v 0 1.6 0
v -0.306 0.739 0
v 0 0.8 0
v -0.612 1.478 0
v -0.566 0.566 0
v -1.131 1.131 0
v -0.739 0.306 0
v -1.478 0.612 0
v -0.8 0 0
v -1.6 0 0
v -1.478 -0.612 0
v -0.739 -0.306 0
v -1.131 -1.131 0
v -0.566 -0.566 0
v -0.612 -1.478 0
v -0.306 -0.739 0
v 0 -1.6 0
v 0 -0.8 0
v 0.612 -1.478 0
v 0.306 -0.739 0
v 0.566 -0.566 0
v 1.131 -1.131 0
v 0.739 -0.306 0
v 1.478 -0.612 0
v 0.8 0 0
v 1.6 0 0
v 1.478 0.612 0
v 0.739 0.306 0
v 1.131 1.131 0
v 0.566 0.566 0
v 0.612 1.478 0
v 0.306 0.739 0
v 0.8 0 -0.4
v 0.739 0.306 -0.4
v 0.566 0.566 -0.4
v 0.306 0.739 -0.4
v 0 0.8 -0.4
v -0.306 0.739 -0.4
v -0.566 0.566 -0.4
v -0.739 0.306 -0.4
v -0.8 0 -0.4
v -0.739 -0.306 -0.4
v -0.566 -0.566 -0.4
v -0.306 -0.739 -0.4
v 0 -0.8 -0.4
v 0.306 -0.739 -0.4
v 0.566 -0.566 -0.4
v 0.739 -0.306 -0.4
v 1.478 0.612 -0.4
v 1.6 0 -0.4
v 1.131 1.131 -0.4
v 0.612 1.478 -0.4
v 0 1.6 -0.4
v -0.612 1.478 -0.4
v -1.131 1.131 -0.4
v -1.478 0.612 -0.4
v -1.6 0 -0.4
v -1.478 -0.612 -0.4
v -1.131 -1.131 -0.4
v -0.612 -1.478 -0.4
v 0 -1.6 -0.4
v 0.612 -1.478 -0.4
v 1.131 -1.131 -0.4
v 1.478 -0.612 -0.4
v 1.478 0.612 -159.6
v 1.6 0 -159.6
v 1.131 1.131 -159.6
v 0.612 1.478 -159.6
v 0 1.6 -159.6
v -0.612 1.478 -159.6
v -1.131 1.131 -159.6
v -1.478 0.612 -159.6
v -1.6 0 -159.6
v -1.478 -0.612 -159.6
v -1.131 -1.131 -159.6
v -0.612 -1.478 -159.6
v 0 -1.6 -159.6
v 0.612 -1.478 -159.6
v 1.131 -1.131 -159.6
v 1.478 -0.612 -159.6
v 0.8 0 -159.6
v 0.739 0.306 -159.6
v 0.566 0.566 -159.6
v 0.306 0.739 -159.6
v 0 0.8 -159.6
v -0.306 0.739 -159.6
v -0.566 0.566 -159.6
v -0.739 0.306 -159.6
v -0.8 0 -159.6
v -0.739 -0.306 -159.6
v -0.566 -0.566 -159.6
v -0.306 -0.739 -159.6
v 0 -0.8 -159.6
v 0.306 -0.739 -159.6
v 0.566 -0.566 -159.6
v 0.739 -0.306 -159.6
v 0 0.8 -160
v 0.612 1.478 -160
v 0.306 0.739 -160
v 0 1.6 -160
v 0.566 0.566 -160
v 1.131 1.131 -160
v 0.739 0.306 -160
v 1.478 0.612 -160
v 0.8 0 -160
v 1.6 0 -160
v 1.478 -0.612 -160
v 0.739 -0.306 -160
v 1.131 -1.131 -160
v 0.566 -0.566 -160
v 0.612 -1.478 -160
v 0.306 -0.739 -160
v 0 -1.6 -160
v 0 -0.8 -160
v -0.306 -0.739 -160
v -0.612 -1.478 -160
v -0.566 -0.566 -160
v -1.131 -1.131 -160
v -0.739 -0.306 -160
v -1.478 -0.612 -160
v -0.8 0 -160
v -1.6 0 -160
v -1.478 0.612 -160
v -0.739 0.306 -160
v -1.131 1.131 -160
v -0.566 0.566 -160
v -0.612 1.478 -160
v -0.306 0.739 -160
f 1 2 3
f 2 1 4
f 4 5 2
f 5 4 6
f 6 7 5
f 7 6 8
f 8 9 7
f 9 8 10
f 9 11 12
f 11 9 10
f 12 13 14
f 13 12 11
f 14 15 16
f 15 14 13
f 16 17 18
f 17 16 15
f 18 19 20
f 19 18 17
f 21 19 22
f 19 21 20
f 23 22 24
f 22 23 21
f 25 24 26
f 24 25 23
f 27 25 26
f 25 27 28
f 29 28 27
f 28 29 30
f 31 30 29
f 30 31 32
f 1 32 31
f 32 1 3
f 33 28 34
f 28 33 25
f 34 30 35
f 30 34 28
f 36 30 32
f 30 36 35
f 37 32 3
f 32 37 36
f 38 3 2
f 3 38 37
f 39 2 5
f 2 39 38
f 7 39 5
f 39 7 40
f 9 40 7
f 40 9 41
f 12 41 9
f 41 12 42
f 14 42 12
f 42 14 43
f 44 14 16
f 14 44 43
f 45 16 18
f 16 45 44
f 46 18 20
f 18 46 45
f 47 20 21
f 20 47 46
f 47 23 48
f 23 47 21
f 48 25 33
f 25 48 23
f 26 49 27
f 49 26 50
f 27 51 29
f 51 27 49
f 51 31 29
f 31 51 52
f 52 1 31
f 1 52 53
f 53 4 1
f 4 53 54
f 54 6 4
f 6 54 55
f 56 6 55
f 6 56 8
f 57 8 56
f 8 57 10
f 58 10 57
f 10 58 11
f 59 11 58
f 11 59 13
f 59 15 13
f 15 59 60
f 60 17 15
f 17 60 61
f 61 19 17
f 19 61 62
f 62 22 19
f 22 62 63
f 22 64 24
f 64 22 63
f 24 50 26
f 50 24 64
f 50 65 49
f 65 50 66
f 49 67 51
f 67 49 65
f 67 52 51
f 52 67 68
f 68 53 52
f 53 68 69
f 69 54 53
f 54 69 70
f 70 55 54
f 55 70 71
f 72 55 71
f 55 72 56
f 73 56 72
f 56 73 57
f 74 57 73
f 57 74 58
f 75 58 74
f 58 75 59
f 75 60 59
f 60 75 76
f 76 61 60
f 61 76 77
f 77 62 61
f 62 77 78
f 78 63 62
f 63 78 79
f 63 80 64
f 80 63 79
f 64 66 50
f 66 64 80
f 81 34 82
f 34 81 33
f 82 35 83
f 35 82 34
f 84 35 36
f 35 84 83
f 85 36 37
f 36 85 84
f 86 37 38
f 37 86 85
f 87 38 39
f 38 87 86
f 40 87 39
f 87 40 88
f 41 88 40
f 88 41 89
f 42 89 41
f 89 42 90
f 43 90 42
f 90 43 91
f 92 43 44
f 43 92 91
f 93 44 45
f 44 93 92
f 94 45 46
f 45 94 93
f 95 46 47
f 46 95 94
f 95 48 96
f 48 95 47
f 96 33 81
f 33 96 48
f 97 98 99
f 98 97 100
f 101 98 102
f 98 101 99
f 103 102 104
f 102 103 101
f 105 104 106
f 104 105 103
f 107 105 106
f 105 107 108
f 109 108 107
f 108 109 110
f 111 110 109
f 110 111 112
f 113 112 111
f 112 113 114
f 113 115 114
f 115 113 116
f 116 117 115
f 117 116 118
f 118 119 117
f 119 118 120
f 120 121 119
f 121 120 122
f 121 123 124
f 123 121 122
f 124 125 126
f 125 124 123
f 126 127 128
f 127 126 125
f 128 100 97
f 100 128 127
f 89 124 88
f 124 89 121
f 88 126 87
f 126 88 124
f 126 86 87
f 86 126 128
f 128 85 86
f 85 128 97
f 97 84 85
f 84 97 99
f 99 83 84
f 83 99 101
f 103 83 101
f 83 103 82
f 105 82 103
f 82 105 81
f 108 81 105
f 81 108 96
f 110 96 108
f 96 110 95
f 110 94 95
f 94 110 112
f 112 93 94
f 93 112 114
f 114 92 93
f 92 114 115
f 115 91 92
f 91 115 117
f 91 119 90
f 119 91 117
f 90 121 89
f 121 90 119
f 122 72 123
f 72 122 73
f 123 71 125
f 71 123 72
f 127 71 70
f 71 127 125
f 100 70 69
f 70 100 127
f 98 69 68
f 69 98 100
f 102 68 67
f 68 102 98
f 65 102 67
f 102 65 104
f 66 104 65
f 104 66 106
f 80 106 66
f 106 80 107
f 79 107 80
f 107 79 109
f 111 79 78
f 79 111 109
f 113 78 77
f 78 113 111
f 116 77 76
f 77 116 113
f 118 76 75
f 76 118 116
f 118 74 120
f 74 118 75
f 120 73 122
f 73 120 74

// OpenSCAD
// file: ../p/4-4ring1.scad
use <../lib.scad>
function ldraw_lib__4_4ring1() = [
// 0 Ring  1 x 1.0
// 0 Name: 4-4ring1.dat
// 0 Author: James Jessiman
// 0 !LDRAW_ORG Primitive UPDATE 2009-01
// 0 !LICENSE Licensed under CC BY 2.0 and CC BY 4.0 : see CAreadme.txt
// 
// 0 BFC CERTIFY CCW
  [0,"BFC","CERTIFY"],
  [0,"BFC","CCW"],
// 
// 0 !HISTORY 1998-12-15 [PTadmin] Official Update 1998-10
// 0 !HISTORY 2002-04-08 [BrickCaster] Modified for BFC compliance
// 0 !HISTORY 2002-04-25 [PTadmin] Official Update 2002-02
// 0 !HISTORY 2007-06-24 [PTadmin] Header formatted for Contributor Agreement
// 0 !HISTORY 2008-07-01 [PTadmin] Official Update 2008-01
// 0 !HISTORY 2008-08-26 [cwdee] Switch polygon winding and rename
// 0 !HISTORY 2009-05-02 [PTadmin] Official Update 2009-01
// 
// 
// 4 16 -0.7654 0 1.8478 -0.3827 0 0.9239 0 0 1 0 0 2
  [4,16,-0.7654,0,1.8478,-0.3827,0,0.9239,0,0,1,0,0,2],
// 4 16 -1.4142 0 1.4142 -0.7071 0 0.7071 -0.3827 0 0.9239 -0.7654 0 1.8478
  [4,16,-1.4142,0,1.4142,-0.7071,0,0.7071,-0.3827,0,0.9239,-0.7654,0,1.8478],
// 4 16 -1.8478 0 0.7654 -0.9239 0 0.3827 -0.7071 0 0.7071 -1.4142 0 1.41420
  [4,16,-1.8478,0,0.7654,-0.9239,0,0.3827,-0.7071,0,0.7071,-1.4142,0,1.41420],
// 4 16 -2 0 0 -1 0 0 -0.9239 0 0.3827 -1.8478 0 0.7654
  [4,16,-2,0,0,-1,0,0,-0.9239,0,0.3827,-1.8478,0,0.7654],
// 4 16 -1.8478 0 -0.7654 -0.9239 0 -0.3827 -1 0 0 -2 0 0
  [4,16,-1.8478,0,-0.7654,-0.9239,0,-0.3827,-1,0,0,-2,0,0],
// 4 16 -1.4142 0 -1.4142 -0.7071 0 -0.7071 -0.9239 0 -0.3827 -1.8478 0 -0.7654
  [4,16,-1.4142,0,-1.4142,-0.7071,0,-0.7071,-0.9239,0,-0.3827,-1.8478,0,-0.7654],
// 4 16 -0.7654 0 -1.8478 -0.3827 0 -0.9239 -0.7071 0 -0.7071 -1.4142 0 -1.4142
  [4,16,-0.7654,0,-1.8478,-0.3827,0,-0.9239,-0.7071,0,-0.7071,-1.4142,0,-1.4142],
// 4 16 0 0 -2 0 0 -1 -0.3827 0 -0.9239 -0.7654 0 -1.8478
  [4,16,0,0,-2,0,0,-1,-0.3827,0,-0.9239,-0.7654,0,-1.8478],
// 4 16 0.7654 0 -1.8478 0.3827 0 -0.9239 0 0 -1 0 0 -2
  [4,16,0.7654,0,-1.8478,0.3827,0,-0.9239,0,0,-1,0,0,-2],
// 4 16 1.4142 0 -1.4142 0.7071 0 -0.7071 0.3827 0 -0.9239 0.7654 0 -1.8478
  [4,16,1.4142,0,-1.4142,0.7071,0,-0.7071,0.3827,0,-0.9239,0.7654,0,-1.8478],
// 4 16 1.8478 0 -0.7654 0.9239 0 -0.3827 0.7071 0 -0.7071 1.4142 0 -1.4142
  [4,16,1.8478,0,-0.7654,0.9239,0,-0.3827,0.7071,0,-0.7071,1.4142,0,-1.4142],
// 4 16 2 0 0 1 0 0 0.9239 0 -0.3827 1.8478 0 -0.7654
  [4,16,2,0,0,1,0,0,0.9239,0,-0.3827,1.8478,0,-0.7654],
// 4 16 1.8478 0 0.7654 0.9239 0 0.3827 1 0 0 2 0 0
  [4,16,1.8478,0,0.7654,0.9239,0,0.3827,1,0,0,2,0,0],
// 4 16 1.4142 0 1.4142 0.7071 0 0.7071 0.9239 0 0.3827 1.8478 0 0.7654
  [4,16,1.4142,0,1.4142,0.7071,0,0.7071,0.9239,0,0.3827,1.8478,0,0.7654],
// 4 16 0.7654 0 1.8478 0.3827 0 0.9239 0.7071 0 0.7071 1.4142 0 1.4142
  [4,16,0.7654,0,1.8478,0.3827,0,0.9239,0.7071,0,0.7071,1.4142,0,1.4142],
// 4 16 0 0 2 0 0 1 0.3827 0 0.9239 0.7654 0 1.8478
  [4,16,0,0,2,0,0,1,0.3827,0,0.9239,0.7654,0,1.8478],
// 0
];
makepoly(ldraw_lib__4_4ring1(), line=0.2);
// file: ../p/4-4edge.scad
use <../lib.scad>
function ldraw_lib__4_4edge() = [
// 0 Circle 1.0
// 0 Name: 4-4edge.dat
// 0 Author: James Jessiman
// 0 !LDRAW_ORG Primitive UPDATE 2017-01
// 0 !LICENSE Licensed under CC BY 2.0 and CC BY 4.0 : see CAreadme.txt
// 
// 0 BFC CERTIFY CCW
  [0,"BFC","CERTIFY"],
  [0,"BFC","CCW"],
// 
// 0 !HISTORY 1998-12-15 [PTadmin] Official Update 1998-10
// 0 !HISTORY 2005-12-28 [PTadmin] Official Update 2005-01
// 0 !HISTORY 2007-06-24 [PTadmin] Header formatted for Contributor Agreement
// 0 !HISTORY 2008-07-01 [PTadmin] Official Update 2008-01
// 0 !HISTORY 2017-01-15 [Steffen] BFCed
// 0 !HISTORY 2017-12-30 [PTadmin] Official Update 2017-01
// 
// 
// 2 24 1 0 0 0.9239 0 0.3827
  [2,24,1,0,0,0.9239,0,0.3827],
// 2 24 0.9239 0 0.3827 0.7071 0 0.7071
  [2,24,0.9239,0,0.3827,0.7071,0,0.7071],
// 2 24 0.7071 0 0.7071 0.3827 0 0.9239
  [2,24,0.7071,0,0.7071,0.3827,0,0.9239],
// 2 24 0.3827 0 0.9239 0 0 1
  [2,24,0.3827,0,0.9239,0,0,1],
// 2 24 0 0 1 -0.3827 0 0.9239
  [2,24,0,0,1,-0.3827,0,0.9239],
// 2 24 -0.3827 0 0.9239 -0.7071 0 0.7071
  [2,24,-0.3827,0,0.9239,-0.7071,0,0.7071],
// 2 24 -0.7071 0 0.7071 -0.9239 0 0.3827
  [2,24,-0.7071,0,0.7071,-0.9239,0,0.3827],
// 2 24 -0.9239 0 0.3827 -1 0 -0
  [2,24,-0.9239,0,0.3827,-1,0,-0],
// 2 24 -1 0 -0 -0.9239 0 -0.3827
  [2,24,-1,0,-0,-0.9239,0,-0.3827],
// 2 24 -0.9239 0 -0.3827 -0.7071 0 -0.7071
  [2,24,-0.9239,0,-0.3827,-0.7071,0,-0.7071],
// 2 24 -0.7071 0 -0.7071 -0.3827 0 -0.9239
  [2,24,-0.7071,0,-0.7071,-0.3827,0,-0.9239],
// 2 24 -0.3827 0 -0.9239 0 0 -1
  [2,24,-0.3827,0,-0.9239,0,0,-1],
// 2 24 0 0 -1 0.3827 0 -0.9239
  [2,24,0,0,-1,0.3827,0,-0.9239],
// 2 24 0.3827 0 -0.9239 0.7071 0 -0.7071
  [2,24,0.3827,0,-0.9239,0.7071,0,-0.7071],
// 2 24 0.7071 0 -0.7071 0.9239 0 -0.3827
  [2,24,0.7071,0,-0.7071,0.9239,0,-0.3827],
// 2 24 0.9239 0 -0.3827 1 0 0
  [2,24,0.9239,0,-0.3827,1,0,0],
];
makepoly(ldraw_lib__4_4edge(), line=0.2);
// file: ../p/4-4cyli.scad
use <../lib.scad>
function ldraw_lib__4_4cyli() = [
// 0 Cylinder 1.0
// 0 Name: 4-4cyli.dat
// 0 Author: James Jessiman
// 0 !LDRAW_ORG Primitive UPDATE 2005-01
// 0 !LICENSE Licensed under CC BY 2.0 and CC BY 4.0 : see CAreadme.txt
// 
// 0 BFC CERTIFY CCW
  [0,"BFC","CERTIFY"],
  [0,"BFC","CCW"],
// 
// 0 !HISTORY 1998-12-15 [PTadmin] Official Update 1998-10
// 0 !HISTORY 2002-03-23 [sbliss] Added BFC statement; merged headers from files in distributions LDraw 0.27 and Complete.
// 0 !HISTORY 2002-04-25 [PTadmin] Official Update 2002-02
// 0 !HISTORY 2004-12-14 [guyvivan] BFC CCW
// 0 !HISTORY 2005-12-28 [PTadmin] Official Update 2005-01
// 0 !HISTORY 2007-06-24 [PTadmin] Header formatted for Contributor Agreement
// 0 !HISTORY 2008-07-01 [PTadmin] Official Update 2008-01
// 
// 
// 4 16 1 1 0 0.9239 1 0.3827 0.9239 0 0.3827 1 0 0
  [4,16,1,1,0,0.9239,1,0.3827,0.9239,0,0.3827,1,0,0],
// 5 24 1 0 0 1 1 0 0.9239 0 0.3827 0.9239 0 -0.3827
  [5,24,1,0,0,1,1,0,0.9239,0,0.3827,0.9239,0,-0.3827],
// 4 16 0.9239 1 0.3827 0.7071 1 0.7071 0.7071 0 0.7071 0.9239 0 0.3827
  [4,16,0.9239,1,0.3827,0.7071,1,0.7071,0.7071,0,0.7071,0.9239,0,0.3827],
// 5 24 0.9239 0 0.3827 0.9239 1 0.3827 0.7071 0 0.7071 1 0 0
  [5,24,0.9239,0,0.3827,0.9239,1,0.3827,0.7071,0,0.7071,1,0,0],
// 4 16 0.7071 1 0.7071 0.3827 1 0.9239 0.3827 0 0.9239 0.7071 0 0.7071
  [4,16,0.7071,1,0.7071,0.3827,1,0.9239,0.3827,0,0.9239,0.7071,0,0.7071],
// 5 24 0.7071 0 0.7071 0.7071 1 0.7071 0.3827 0 0.9239 0.9239 0 0.3827
  [5,24,0.7071,0,0.7071,0.7071,1,0.7071,0.3827,0,0.9239,0.9239,0,0.3827],
// 4 16 0.3827 1 0.9239 0 1 1 0 0 1 0.3827 0 0.9239
  [4,16,0.3827,1,0.9239,0,1,1,0,0,1,0.3827,0,0.9239],
// 5 24 0.3827 0 0.9239 0.3827 1 0.9239 0 0 1 0.7071 0 0.7071
  [5,24,0.3827,0,0.9239,0.3827,1,0.9239,0,0,1,0.7071,0,0.7071],
// 4 16 0 1 1 -0.3827 1 0.9239 -0.3827 0 0.9239 0 0 1
  [4,16,0,1,1,-0.3827,1,0.9239,-0.3827,0,0.9239,0,0,1],
// 5 24 0 0 1 0 1 1 -0.3827 0 0.9239 0.3827 0 0.9239
  [5,24,0,0,1,0,1,1,-0.3827,0,0.9239,0.3827,0,0.9239],
// 4 16 -0.3827 1 0.9239 -0.7071 1 0.7071 -0.7071 0 0.7071 -0.3827 0 0.9239
  [4,16,-0.3827,1,0.9239,-0.7071,1,0.7071,-0.7071,0,0.7071,-0.3827,0,0.9239],
// 5 24 -0.3827 0 0.9239 -0.3827 1 0.9239 -0.7071 0 0.7071 0 0 1
  [5,24,-0.3827,0,0.9239,-0.3827,1,0.9239,-0.7071,0,0.7071,0,0,1],
// 4 16 -0.7071 1 0.7071 -0.9239 1 0.3827 -0.9239 0 0.3827 -0.7071 0 0.7071
  [4,16,-0.7071,1,0.7071,-0.9239,1,0.3827,-0.9239,0,0.3827,-0.7071,0,0.7071],
// 5 24 -0.7071 0 0.7071 -0.7071 1 0.7071 -0.9239 0 0.3827 -0.3827 0 0.9239
  [5,24,-0.7071,0,0.7071,-0.7071,1,0.7071,-0.9239,0,0.3827,-0.3827,0,0.9239],
// 4 16 -0.9239 1 0.3827 -1 1 0 -1 0 0 -0.9239 0 0.3827
  [4,16,-0.9239,1,0.3827,-1,1,0,-1,0,0,-0.9239,0,0.3827],
// 5 24 -0.9239 0 0.3827 -0.9239 1 0.3827 -1 0 0 -0.7071 0 0.7071
  [5,24,-0.9239,0,0.3827,-0.9239,1,0.3827,-1,0,0,-0.7071,0,0.7071],
// 4 16 -1 1 0 -0.9239 1 -0.3827 -0.9239 0 -0.3827 -1 0 0
  [4,16,-1,1,0,-0.9239,1,-0.3827,-0.9239,0,-0.3827,-1,0,0],
// 5 24 -1 0 0 -1 1 0 -0.9239 0 -0.3827 -0.9239 0 0.3827
  [5,24,-1,0,0,-1,1,0,-0.9239,0,-0.3827,-0.9239,0,0.3827],
// 4 16 -0.9239 1 -0.3827 -0.7071 1 -0.7071 -0.7071 0 -0.7071 -0.9239 0 -0.3827
  [4,16,-0.9239,1,-0.3827,-0.7071,1,-0.7071,-0.7071,0,-0.7071,-0.9239,0,-0.3827],
// 5 24 -0.9239 0 -0.3827 -0.9239 1 -0.3827 -0.7071 0 -0.7071 -1 0 0
  [5,24,-0.9239,0,-0.3827,-0.9239,1,-0.3827,-0.7071,0,-0.7071,-1,0,0],
// 4 16 -0.7071 1 -0.7071 -0.3827 1 -0.9239 -0.3827 0 -0.9239 -0.7071 0 -0.7071
  [4,16,-0.7071,1,-0.7071,-0.3827,1,-0.9239,-0.3827,0,-0.9239,-0.7071,0,-0.7071],
// 5 24 -0.7071 0 -0.7071 -0.7071 1 -0.7071 -0.3827 0 -0.9239 -0.9239 0 -0.3827
  [5,24,-0.7071,0,-0.7071,-0.7071,1,-0.7071,-0.3827,0,-0.9239,-0.9239,0,-0.3827],
// 4 16 -0.3827 1 -0.9239 0 1 -1 0 0 -1 -0.3827 0 -0.9239
  [4,16,-0.3827,1,-0.9239,0,1,-1,0,0,-1,-0.3827,0,-0.9239],
// 5 24 -0.3827 0 -0.9239 -0.3827 1 -0.9239 0 0 -1 -0.7071 0 -0.7071
  [5,24,-0.3827,0,-0.9239,-0.3827,1,-0.9239,0,0,-1,-0.7071,0,-0.7071],
// 4 16 0 1 -1 0.3827 1 -0.9239 0.3827 0 -0.9239 0 0 -1
  [4,16,0,1,-1,0.3827,1,-0.9239,0.3827,0,-0.9239,0,0,-1],
// 5 24 0 0 -1 0 1 -1 0.3827 0 -0.9239 -0.3827 0 -0.9239
  [5,24,0,0,-1,0,1,-1,0.3827,0,-0.9239,-0.3827,0,-0.9239],
// 4 16 0.3827 1 -0.9239 0.7071 1 -0.7071 0.7071 0 -0.7071 0.3827 0 -0.9239
  [4,16,0.3827,1,-0.9239,0.7071,1,-0.7071,0.7071,0,-0.7071,0.3827,0,-0.9239],
// 5 24 0.3827 0 -0.9239 0.3827 1 -0.9239 0.7071 0 -0.7071 0 0 -1
  [5,24,0.3827,0,-0.9239,0.3827,1,-0.9239,0.7071,0,-0.7071,0,0,-1],
// 4 16 0.7071 1 -0.7071 0.9239 1 -0.3827 0.9239 0 -0.3827 0.7071 0 -0.7071
  [4,16,0.7071,1,-0.7071,0.9239,1,-0.3827,0.9239,0,-0.3827,0.7071,0,-0.7071],
// 5 24 0.7071 0 -0.7071 0.7071 1 -0.7071 0.9239 0 -0.3827 0.3827 0 -0.9239
  [5,24,0.7071,0,-0.7071,0.7071,1,-0.7071,0.9239,0,-0.3827,0.3827,0,-0.9239],
// 4 16 0.9239 1 -0.3827 1 1 0 1 0 0 0.9239 0 -0.3827
  [4,16,0.9239,1,-0.3827,1,1,0,1,0,0,0.9239,0,-0.3827],
// 5 24 0.9239 0 -0.3827 0.9239 1 -0.3827 1 0 0 0.7071 0 -0.7071
  [5,24,0.9239,0,-0.3827,0.9239,1,-0.3827,1,0,0,0.7071,0,-0.7071],
// 0
];
makepoly(ldraw_lib__4_4cyli(), line=0.2);
// file: u9053.scad
use <../lib.scad>
use <../p/4-4cyli.scad>
use <../p/4-4edge.scad>
use <../p/4-4ring1.scad>
function ldraw_lib__u9053() = [
// 0 ~Technic Flex-System Hose End
// 0 Name: u9053.dat
// 0 Author: William Howard [WilliamH]
// 0 !LDRAW_ORG Part UPDATE 2011-02
// 0 !LICENSE Licensed under CC BY 2.0 and CC BY 4.0 : see CAreadme.txt
// 
// 0 BFC CERTIFY CCW
  [0,"BFC","CERTIFY"],
  [0,"BFC","CCW"],
// 
// 0 !HISTORY 2011-12-21 [cwdee] Reworked subparting technique
// 0 !HISTORY 2011-12-23 [PTadmin] Renamed from 76
// 0 !HISTORY 2011-12-29 [PTadmin] Official Update 2011-02
// 
// 
// 1 16 0 0 0 2 0 0 0 1 0 0 0 2 4-4ring1.dat
  [1,16,0,0,0,2,0,0,0,1,0,0,0,2, ldraw_lib__4_4ring1()],
// 1 16 0 0 0 2 0 0 0 1 0 0 0 2 4-4edge.dat
  [1,16,0,0,0,2,0,0,0,1,0,0,0,2, ldraw_lib__4_4edge()],
// 0 BFC INVERTNEXT
  [0,"BFC","INVERTNEXT"],
// 1 16 0 0 0 2 0 0 0 1 0 0 0 2 4-4cyli.dat
  [1,16,0,0,0,2,0,0,0,1,0,0,0,2, ldraw_lib__4_4cyli()],
// 1 16 0 0 0 4 0 0 0 1 0 0 0 4 4-4edge.dat
  [1,16,0,0,0,4,0,0,0,1,0,0,0,4, ldraw_lib__4_4edge()],
// 1 16 0 0 0 4 0 0 0 1 0 0 0 4 4-4cyli.dat
  [1,16,0,0,0,4,0,0,0,1,0,0,0,4, ldraw_lib__4_4cyli()],
// 0
];
makepoly(ldraw_lib__u9053(), line=0.2);
// file: 77.scad
use <../lib.scad>
use <../p/4-4cyli.scad>
function ldraw_lib__77() = [
// 0 ~Technic Flex-System Hose Segment
// 0 Name: 77.dat
// 0 Author: William Howard [WilliamH]
// 0 !LDRAW_ORG Part UPDATE 2011-02
// 0 !LICENSE Licensed under CC BY 2.0 and CC BY 4.0 : see CAreadme.txt
// 
// 0 BFC CERTIFY CCW
  [0,"BFC","CERTIFY"],
  [0,"BFC","CCW"],
// 
// 0 !HISTORY 2011-12-21 [cwdee] Reworked subparting technique
// 0 !HISTORY 2011-12-29 [PTadmin] Official Update 2011-02
// 
// 
// 1 16 0 0 0 4 0 0 0 1 0 0 0 4 4-4cyli.dat
  [1,16,0,0,0,4,0,0,0,1,0,0,0,4, ldraw_lib__4_4cyli()],
// 0 BFC INVERTNEXT
  [0,"BFC","INVERTNEXT"],
// 1 16 0 0 0 2 0 0 0 1 0 0 0 2 4-4cyli.dat
  [1,16,0,0,0,2,0,0,0,1,0,0,0,2, ldraw_lib__4_4cyli()],
// 0
];
makepoly(ldraw_lib__77(), line=0.2);
// main file
use <../lib.scad>
use <77.scad>
use <u9053.scad>
function ldraw_lib__76276() = [
// 0 Technic Flex-System Hose 20L (400LDU)
// 0 Name: 76276.dat
// 0 Author: Tim Gould [timgould]
// 0 !LDRAW_ORG Part UPDATE 2011-02
// 0 !LICENSE Licensed under CC BY 2.0 and CC BY 4.0 : see CAreadme.txt
// 
// 0 BFC CERTIFY CCW
  [0,"BFC","CERTIFY"],
  [0,"BFC","CCW"],
// 
// 0 !KEYWORDS bar, tube
// 
// 0 !HISTORY 2011-12-29 [PTadmin] Official Update 2011-02
// 
// 
// 1 16 0 0 0 1 0 0 0 1 0 0 0 1 u9053.dat
  [1,16,0,0,0,1,0,0,0,1,0,0,0,1, ldraw_lib__u9053()],
// 1 16 0 1 0 1 0 0 0 398 0 0 0 1 77.dat
  [1,16,0,1,0,1,0,0,0,398,0,0,0,1, ldraw_lib__77()],
// 1 16 0 400 0 -1 0 0 0 -1 0 0 0 1 u9053.dat
  [1,16,0,400,0,-1,0,0,0,-1,0,0,0,1, ldraw_lib__u9053()],
];
makepoly(ldraw_lib__76276(), line=0.2);
